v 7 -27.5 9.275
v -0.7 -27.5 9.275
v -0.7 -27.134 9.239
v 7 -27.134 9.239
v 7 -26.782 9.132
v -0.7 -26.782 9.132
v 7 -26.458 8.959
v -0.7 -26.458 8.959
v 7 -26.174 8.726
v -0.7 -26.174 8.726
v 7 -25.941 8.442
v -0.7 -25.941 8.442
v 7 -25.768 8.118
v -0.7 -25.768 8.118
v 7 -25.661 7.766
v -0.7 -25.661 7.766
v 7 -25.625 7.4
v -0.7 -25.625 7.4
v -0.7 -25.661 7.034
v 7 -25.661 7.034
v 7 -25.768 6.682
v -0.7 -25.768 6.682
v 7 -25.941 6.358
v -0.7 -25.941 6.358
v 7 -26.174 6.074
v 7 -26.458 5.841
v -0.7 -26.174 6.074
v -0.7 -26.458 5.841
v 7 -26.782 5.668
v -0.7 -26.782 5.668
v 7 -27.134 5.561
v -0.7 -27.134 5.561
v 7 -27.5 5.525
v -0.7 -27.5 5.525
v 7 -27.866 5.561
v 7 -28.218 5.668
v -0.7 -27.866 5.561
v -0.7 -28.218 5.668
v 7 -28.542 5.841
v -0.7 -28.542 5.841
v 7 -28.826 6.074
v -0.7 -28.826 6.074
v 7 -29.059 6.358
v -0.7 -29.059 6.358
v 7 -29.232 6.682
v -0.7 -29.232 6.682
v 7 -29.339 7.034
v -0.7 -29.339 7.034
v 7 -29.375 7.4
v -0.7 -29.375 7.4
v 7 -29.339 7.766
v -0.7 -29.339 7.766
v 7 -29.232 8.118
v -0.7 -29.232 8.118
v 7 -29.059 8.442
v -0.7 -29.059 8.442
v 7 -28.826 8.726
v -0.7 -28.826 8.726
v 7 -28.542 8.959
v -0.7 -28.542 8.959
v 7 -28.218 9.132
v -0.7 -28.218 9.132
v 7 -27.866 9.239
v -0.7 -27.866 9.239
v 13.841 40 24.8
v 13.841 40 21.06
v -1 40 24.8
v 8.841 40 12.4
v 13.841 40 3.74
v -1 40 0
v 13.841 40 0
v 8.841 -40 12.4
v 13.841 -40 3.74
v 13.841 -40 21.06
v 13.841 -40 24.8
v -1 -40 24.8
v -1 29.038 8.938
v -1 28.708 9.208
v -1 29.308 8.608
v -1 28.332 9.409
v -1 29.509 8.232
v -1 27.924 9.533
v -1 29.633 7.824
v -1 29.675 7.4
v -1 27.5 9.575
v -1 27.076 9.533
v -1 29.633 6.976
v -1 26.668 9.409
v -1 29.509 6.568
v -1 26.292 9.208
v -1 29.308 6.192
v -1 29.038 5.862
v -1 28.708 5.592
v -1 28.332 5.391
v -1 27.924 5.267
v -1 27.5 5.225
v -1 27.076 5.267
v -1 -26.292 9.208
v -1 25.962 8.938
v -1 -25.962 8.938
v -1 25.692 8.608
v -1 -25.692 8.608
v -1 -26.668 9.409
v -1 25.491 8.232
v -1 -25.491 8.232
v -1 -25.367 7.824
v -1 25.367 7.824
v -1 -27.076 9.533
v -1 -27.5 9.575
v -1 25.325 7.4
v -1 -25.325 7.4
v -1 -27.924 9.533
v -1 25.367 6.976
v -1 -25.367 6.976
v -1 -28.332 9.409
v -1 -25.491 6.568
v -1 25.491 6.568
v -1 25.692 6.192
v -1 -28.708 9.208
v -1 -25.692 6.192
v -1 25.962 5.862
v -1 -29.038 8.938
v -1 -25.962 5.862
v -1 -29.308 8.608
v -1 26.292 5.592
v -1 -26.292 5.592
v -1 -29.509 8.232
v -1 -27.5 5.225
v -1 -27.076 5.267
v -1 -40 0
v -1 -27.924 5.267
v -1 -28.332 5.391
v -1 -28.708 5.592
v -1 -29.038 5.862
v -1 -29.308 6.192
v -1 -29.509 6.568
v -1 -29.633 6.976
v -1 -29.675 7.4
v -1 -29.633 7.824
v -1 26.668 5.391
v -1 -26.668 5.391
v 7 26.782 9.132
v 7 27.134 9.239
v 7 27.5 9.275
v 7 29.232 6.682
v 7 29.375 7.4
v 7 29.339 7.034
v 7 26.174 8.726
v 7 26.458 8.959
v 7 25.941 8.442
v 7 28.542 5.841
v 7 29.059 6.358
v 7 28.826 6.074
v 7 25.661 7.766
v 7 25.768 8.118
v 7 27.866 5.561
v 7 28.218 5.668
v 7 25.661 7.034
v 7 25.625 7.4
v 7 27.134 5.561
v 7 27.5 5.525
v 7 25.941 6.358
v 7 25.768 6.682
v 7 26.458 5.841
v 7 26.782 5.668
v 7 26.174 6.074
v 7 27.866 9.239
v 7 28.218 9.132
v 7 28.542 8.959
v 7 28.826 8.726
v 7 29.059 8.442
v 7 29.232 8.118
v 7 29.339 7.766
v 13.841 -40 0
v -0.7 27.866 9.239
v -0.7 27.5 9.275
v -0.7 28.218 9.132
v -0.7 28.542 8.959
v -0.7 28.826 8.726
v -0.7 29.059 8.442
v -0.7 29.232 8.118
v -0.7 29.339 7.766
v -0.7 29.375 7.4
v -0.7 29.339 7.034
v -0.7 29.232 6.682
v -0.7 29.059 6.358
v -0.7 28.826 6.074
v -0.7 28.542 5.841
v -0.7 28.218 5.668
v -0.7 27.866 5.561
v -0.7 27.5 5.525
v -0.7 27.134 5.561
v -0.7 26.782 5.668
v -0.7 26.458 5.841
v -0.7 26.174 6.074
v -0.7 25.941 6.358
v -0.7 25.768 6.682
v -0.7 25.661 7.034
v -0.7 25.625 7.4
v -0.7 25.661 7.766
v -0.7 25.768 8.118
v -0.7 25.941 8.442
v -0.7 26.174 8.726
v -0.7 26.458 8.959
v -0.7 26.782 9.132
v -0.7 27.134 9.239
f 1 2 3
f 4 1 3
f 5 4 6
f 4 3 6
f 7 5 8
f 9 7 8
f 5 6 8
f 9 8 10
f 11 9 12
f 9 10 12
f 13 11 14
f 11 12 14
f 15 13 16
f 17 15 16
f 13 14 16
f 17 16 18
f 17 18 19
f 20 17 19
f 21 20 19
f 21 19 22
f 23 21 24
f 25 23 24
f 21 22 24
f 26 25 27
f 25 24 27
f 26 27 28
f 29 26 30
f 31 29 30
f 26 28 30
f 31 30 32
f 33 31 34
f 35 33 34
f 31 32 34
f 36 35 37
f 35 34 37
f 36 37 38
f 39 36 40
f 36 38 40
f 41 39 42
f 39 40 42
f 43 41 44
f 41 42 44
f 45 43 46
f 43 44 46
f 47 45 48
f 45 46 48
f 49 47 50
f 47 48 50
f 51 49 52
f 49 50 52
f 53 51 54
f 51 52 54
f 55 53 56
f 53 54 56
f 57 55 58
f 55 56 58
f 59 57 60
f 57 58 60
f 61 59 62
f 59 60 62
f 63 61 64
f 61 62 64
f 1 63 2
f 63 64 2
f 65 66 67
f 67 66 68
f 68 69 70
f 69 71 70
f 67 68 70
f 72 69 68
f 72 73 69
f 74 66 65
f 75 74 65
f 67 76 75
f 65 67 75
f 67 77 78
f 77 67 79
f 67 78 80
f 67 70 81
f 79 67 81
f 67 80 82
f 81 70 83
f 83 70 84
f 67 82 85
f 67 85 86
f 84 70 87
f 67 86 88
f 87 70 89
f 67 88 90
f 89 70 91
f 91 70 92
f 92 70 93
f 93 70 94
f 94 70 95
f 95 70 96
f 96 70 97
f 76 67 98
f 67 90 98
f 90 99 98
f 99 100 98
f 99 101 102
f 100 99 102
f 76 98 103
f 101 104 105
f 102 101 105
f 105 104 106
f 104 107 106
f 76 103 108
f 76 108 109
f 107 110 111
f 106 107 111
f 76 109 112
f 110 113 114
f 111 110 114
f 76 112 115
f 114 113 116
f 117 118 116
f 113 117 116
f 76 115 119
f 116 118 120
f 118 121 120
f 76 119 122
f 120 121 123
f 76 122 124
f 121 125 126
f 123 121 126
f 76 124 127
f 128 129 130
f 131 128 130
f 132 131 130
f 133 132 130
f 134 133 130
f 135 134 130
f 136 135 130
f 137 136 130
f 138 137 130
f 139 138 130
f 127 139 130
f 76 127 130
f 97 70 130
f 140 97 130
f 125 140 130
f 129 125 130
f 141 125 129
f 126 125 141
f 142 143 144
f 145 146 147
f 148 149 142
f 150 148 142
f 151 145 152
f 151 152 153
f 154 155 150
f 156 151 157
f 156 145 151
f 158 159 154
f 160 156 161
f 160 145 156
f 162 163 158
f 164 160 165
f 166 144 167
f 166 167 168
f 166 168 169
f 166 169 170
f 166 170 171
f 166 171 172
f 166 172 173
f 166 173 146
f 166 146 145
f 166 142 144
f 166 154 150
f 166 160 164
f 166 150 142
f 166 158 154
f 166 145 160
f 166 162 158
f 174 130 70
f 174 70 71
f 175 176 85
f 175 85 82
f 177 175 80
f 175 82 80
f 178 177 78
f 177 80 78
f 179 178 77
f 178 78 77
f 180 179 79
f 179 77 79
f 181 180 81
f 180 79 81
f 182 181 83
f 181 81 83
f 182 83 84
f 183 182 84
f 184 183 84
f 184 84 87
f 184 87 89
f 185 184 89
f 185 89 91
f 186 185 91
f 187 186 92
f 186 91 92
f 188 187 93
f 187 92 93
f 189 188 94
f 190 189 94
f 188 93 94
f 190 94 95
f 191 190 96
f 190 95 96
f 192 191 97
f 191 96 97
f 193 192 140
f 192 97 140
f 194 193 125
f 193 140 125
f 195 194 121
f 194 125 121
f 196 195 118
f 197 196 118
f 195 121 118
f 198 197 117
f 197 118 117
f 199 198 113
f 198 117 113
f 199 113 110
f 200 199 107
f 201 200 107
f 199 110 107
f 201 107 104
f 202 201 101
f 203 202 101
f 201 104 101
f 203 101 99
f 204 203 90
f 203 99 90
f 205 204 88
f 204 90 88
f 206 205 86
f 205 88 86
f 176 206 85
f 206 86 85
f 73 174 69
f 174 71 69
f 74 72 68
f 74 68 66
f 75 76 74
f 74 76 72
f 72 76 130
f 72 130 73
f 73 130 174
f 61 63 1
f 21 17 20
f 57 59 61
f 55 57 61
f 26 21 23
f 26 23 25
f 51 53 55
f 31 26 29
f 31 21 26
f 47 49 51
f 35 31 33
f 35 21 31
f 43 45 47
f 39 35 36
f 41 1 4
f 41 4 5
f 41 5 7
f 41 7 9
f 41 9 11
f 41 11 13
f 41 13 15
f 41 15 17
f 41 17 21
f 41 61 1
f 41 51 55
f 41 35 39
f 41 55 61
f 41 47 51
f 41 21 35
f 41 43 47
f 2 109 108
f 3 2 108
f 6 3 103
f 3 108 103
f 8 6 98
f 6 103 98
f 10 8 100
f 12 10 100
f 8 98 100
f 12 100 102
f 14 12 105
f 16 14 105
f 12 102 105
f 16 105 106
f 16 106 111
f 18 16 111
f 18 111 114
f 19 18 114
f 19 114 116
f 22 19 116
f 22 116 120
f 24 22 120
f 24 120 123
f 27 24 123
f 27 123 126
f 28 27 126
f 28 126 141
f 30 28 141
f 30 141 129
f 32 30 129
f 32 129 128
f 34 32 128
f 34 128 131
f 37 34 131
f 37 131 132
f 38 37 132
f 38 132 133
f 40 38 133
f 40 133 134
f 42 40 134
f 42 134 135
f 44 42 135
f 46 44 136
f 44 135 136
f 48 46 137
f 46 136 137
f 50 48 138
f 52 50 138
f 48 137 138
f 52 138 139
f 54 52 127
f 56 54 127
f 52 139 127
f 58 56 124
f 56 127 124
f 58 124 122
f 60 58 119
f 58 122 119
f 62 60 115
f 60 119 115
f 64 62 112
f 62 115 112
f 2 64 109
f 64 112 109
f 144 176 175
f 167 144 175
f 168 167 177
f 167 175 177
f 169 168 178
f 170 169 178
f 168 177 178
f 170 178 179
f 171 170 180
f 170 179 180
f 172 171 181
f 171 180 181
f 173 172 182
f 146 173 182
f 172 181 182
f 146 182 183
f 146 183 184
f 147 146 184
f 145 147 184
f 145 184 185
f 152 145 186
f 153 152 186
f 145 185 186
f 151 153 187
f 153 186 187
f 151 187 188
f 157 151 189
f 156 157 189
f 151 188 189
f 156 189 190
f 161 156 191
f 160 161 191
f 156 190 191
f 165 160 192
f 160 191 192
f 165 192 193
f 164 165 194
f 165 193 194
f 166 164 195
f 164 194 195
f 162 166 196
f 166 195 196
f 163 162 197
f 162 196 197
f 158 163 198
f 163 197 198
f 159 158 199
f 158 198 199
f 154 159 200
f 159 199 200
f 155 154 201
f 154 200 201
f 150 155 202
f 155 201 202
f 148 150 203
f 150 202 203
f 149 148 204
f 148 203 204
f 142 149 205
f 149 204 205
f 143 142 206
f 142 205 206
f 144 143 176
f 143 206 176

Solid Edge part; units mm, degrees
sketch "Sketch1" plane through (0, 0, 0) normal (0, 0, 1) x (1, 0, 0)
  line L0 (-1, -40) -> (1, -40)
  line L1 (1, -40) -> (1, 40)
  line L2 (1, 40) -> (-1, 40)
  line L3 (-1, 40) -> (-1, -40)
  dimension "D1" = 80
  dimension "D2" = 2
extrude "Protrusion1" add sketch "Sketch1" along normal blind 24.8
sketch "Sketch2" plane through (0, -40, 8) normal (0, -1, 0) x (0, 0, 1)
  line L0 (-8, -1) -> (-8, -16)
  line L1 (-8, -16) -> (4.4, -8.8409)
  line L2 (4.4, -8.8409) -> (16.8, -16)
  line L3 (16.8, -16) -> (16.8, -1)
  dimension "D1" = 15
extrude "Protrusion2" add sketch "Sketch2" against normal up to vertex (80 mm away) material side at (8.5, -40, 0.05)
sketch "Sketch3" plane through (-1, 0, 12.4) normal (-1, 0, 0) x (0, 0, 1)
  circle A0 centre (-5, 27.5) radius 1.875
  circle A1 centre (-5, -27.5) radius 1.875
  dimension "D1" = 55
  dimension "D2" = 3.75
  dimension "D3" = 7.4
extrude "Extrusionsausschnitt_5" cut sketch "Sketch3" against normal blind 8
sketch "Sketch4" plane through (7.5, 40, 12.4) normal (0, 1, 0) x (0, 0, 1)
  line L0 (-12.4, 6.3409) -> (12.4, 6.3409)
  dimension "D1" = 5
extrude "Cutout1" cut sketch "Sketch4" against normal through all material side at (13.8909, 40, 12.4)
chamfer "Fase_1" distance 0.3 angle 45 2 edges at (-1, 27.5, 5.525) (-1, -27.5, 5.525)
properties material "Polypropylen, allgemein"
